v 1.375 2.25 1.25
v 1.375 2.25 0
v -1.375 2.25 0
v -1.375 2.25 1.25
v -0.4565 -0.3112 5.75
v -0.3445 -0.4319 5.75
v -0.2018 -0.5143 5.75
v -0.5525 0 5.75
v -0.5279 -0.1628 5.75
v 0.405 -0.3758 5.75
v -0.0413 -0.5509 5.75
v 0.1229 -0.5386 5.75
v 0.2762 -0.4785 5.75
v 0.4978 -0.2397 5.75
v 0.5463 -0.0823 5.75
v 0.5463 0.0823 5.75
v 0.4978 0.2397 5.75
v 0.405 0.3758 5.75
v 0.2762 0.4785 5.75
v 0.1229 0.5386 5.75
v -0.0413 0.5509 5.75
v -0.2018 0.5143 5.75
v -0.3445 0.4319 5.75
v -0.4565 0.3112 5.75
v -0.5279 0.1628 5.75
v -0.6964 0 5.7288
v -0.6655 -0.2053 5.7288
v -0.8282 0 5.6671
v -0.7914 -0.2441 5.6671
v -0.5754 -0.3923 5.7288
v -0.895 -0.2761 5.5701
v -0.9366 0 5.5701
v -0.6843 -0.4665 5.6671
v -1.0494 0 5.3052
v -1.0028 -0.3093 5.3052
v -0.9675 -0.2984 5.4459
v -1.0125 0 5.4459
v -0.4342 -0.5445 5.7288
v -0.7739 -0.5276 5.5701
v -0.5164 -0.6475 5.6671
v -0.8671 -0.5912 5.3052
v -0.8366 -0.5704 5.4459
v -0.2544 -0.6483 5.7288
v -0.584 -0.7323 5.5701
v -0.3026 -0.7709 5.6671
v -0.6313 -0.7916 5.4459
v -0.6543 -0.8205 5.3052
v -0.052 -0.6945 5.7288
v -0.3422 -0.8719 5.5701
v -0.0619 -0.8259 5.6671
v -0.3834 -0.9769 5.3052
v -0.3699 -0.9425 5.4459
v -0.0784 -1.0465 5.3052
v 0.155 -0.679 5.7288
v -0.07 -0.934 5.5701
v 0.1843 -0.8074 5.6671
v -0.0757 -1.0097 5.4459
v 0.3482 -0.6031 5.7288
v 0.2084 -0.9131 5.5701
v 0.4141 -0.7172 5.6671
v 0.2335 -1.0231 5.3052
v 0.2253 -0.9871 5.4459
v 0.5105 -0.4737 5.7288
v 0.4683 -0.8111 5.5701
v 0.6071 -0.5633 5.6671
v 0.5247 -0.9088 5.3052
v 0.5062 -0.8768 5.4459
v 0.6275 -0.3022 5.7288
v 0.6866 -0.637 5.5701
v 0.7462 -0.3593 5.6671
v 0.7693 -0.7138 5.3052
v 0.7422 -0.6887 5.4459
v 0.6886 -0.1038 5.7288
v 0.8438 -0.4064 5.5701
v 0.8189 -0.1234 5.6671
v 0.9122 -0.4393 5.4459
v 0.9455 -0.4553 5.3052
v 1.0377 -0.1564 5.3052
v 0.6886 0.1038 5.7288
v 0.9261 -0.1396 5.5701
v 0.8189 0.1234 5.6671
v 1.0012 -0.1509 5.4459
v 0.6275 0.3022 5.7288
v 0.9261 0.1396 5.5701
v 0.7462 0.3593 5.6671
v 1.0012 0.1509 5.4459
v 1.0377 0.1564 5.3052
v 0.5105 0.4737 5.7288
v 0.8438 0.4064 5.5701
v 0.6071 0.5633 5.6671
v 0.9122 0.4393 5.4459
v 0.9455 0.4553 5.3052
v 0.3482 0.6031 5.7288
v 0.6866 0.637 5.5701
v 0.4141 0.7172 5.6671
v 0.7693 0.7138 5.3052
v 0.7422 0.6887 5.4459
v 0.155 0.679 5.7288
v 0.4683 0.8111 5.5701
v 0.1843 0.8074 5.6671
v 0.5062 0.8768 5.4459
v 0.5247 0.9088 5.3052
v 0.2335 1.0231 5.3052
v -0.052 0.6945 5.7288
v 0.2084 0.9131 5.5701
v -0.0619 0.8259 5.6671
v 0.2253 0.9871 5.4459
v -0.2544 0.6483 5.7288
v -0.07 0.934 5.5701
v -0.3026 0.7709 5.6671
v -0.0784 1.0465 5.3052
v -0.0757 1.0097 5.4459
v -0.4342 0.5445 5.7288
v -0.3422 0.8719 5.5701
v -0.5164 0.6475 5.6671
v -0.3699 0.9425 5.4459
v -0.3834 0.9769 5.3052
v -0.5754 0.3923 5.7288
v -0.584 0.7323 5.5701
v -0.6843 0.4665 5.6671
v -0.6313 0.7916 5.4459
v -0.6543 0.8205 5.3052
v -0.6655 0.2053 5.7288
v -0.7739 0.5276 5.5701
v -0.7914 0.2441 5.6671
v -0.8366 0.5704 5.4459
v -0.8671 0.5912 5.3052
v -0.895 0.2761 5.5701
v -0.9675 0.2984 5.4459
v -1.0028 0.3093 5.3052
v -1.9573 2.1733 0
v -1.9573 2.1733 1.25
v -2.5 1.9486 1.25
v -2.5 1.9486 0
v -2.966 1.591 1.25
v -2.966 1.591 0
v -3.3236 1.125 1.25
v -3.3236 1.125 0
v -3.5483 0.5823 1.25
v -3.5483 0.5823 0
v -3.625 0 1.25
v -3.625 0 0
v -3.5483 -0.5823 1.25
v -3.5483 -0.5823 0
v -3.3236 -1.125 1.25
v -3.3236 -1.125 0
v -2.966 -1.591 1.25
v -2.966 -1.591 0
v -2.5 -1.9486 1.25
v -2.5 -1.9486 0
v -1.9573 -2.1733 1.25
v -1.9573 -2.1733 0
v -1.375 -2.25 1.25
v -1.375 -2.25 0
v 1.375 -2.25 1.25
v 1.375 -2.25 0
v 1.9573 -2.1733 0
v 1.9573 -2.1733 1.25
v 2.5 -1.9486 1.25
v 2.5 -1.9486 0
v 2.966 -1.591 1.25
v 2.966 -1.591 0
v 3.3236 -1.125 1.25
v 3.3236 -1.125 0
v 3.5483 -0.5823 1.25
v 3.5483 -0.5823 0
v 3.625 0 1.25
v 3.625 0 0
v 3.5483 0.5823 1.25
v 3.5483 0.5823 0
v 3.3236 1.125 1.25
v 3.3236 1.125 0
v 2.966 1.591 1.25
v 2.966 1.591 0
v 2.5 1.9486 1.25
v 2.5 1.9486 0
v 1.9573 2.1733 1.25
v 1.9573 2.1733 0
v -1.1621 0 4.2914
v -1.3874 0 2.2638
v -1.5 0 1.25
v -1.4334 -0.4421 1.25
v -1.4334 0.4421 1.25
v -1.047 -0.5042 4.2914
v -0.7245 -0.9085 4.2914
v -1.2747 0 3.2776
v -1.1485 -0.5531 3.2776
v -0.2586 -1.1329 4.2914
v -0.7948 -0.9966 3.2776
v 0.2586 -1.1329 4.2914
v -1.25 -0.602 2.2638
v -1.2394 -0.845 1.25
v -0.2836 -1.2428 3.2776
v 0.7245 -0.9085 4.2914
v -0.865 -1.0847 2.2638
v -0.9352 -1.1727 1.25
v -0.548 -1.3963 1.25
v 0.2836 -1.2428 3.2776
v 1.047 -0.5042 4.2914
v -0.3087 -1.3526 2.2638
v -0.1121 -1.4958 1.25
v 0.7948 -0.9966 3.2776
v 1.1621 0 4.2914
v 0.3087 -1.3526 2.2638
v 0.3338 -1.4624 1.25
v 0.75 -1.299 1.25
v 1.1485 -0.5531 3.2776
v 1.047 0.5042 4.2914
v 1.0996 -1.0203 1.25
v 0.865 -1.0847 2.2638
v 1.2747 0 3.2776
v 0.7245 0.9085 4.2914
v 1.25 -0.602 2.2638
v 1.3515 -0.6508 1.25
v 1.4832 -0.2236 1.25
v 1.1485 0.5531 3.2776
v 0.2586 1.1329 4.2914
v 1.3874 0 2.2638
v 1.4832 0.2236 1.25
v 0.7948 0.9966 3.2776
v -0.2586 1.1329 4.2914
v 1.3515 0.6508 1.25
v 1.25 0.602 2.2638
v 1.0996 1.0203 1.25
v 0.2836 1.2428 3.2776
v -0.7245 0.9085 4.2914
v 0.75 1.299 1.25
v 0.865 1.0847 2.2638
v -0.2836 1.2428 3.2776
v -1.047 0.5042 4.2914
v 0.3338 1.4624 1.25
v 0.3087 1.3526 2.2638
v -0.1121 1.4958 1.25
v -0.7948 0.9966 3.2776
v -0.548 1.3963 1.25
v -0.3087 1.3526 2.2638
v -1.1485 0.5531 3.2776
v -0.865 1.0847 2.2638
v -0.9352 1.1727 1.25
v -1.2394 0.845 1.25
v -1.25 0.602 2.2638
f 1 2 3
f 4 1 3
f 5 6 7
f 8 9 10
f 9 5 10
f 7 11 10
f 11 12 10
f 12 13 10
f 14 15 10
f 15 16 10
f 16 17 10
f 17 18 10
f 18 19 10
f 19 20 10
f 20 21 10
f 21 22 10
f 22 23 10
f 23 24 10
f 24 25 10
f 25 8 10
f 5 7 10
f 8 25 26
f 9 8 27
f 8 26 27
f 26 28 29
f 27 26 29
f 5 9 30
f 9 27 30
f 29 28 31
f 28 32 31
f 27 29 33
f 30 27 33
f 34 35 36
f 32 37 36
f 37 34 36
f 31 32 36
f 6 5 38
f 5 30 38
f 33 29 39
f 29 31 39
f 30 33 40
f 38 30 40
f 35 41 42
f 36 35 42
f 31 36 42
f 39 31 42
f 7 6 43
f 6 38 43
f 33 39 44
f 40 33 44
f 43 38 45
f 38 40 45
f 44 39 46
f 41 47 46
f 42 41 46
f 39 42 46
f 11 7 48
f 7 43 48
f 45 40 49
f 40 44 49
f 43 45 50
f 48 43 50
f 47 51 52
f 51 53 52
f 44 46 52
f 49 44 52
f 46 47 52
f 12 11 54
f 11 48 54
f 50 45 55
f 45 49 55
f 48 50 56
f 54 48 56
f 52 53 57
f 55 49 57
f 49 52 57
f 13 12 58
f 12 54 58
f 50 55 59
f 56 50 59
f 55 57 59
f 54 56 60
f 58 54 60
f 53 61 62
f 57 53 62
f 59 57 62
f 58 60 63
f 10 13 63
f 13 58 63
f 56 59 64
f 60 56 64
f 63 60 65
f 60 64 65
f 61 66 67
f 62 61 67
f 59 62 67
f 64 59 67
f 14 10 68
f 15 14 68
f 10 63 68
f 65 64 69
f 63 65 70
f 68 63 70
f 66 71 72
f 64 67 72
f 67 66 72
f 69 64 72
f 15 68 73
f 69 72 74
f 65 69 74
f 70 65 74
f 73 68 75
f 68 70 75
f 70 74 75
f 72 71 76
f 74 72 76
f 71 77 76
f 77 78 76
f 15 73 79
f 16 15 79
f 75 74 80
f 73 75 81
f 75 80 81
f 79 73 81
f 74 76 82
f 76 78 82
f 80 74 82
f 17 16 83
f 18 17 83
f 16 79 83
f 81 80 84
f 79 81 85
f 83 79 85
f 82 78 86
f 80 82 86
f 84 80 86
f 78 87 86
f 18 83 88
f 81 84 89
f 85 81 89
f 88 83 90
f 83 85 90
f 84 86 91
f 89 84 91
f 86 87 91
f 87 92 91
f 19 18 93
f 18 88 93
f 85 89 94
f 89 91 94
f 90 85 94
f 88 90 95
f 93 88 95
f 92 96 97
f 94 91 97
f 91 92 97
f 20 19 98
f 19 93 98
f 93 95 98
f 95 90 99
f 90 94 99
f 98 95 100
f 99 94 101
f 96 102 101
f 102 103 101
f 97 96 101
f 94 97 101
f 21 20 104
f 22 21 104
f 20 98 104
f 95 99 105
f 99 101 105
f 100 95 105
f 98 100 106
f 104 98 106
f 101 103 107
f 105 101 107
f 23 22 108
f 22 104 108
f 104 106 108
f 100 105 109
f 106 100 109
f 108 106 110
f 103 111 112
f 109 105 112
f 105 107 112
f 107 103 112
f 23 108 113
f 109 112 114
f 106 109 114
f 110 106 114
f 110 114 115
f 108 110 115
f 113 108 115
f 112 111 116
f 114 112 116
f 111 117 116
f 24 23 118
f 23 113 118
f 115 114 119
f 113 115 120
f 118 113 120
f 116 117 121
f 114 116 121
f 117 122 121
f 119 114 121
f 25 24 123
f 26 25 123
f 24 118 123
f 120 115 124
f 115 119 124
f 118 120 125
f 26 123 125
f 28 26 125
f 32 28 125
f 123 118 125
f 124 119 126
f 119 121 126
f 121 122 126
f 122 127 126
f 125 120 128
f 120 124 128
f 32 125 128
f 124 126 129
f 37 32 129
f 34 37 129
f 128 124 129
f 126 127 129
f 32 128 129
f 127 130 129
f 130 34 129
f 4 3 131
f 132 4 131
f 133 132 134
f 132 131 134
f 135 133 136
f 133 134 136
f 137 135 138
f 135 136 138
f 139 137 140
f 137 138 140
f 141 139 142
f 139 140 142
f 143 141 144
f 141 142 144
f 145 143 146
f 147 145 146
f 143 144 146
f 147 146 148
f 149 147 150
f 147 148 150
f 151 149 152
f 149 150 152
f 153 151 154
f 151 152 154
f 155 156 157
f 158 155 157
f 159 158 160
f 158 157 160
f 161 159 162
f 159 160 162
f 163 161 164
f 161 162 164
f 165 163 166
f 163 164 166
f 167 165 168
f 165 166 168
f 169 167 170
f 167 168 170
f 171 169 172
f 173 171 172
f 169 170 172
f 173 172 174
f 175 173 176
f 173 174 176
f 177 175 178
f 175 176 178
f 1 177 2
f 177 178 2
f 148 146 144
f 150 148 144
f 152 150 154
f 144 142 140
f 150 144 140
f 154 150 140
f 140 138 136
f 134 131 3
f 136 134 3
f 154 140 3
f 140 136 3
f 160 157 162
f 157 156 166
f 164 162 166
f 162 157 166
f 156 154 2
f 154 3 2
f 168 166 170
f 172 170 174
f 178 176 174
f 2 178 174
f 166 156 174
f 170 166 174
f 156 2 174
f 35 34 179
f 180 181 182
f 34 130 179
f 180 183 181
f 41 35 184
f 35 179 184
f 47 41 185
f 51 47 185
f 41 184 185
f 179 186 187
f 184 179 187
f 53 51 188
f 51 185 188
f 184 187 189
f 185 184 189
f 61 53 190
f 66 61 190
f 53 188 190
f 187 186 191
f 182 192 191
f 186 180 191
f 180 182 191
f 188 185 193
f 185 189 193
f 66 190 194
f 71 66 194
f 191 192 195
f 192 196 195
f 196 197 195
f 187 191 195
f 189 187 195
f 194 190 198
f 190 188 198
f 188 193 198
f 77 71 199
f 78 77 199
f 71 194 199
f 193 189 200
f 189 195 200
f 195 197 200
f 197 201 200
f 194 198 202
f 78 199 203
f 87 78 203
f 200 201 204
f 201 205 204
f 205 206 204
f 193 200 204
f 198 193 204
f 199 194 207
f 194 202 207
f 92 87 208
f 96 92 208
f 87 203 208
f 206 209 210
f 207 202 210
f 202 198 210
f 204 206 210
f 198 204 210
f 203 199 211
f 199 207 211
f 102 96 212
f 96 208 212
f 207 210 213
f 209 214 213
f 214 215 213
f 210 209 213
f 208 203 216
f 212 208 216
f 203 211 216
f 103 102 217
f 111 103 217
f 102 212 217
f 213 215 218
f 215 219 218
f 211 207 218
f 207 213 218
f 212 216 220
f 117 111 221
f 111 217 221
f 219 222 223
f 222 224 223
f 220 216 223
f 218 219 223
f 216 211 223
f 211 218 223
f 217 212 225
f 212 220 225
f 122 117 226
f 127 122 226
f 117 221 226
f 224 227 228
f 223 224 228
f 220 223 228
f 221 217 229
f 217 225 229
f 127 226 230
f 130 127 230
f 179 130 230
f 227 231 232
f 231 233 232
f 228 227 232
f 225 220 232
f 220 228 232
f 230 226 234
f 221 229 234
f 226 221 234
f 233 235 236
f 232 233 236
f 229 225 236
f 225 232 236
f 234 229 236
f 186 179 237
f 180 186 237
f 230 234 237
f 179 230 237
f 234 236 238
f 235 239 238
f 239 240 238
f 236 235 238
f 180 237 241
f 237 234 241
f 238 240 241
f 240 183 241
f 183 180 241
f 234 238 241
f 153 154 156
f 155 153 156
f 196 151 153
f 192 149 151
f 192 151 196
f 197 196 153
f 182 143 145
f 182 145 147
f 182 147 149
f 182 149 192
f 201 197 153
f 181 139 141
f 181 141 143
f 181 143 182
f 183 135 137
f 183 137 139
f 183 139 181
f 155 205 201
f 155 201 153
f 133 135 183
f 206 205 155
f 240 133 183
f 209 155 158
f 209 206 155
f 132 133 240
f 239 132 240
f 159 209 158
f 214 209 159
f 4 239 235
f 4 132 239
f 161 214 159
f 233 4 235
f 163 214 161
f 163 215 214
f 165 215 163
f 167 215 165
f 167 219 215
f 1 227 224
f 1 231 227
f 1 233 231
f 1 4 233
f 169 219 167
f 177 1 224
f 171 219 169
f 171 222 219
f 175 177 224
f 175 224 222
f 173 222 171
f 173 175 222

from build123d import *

# Parameters (mm, degrees)
F1_DEPTH = 1.25


with BuildPart() as f1:
    # F0 (on Top) → F1 (new body)
    with BuildSketch(Plane.XY):
        with BuildLine():
            Line((-1.375, -2.25), (1.375, -2.25))
            ThreePointArc((1.375, -2.25), (3.625, 0), (1.375, 2.25))
            Line((1.375, 2.25), (-1.375, 2.25))
            ThreePointArc((-1.375, 2.25), (-3.625, 0), (-1.375, -2.25))
        make_face()
    extrude(amount=F1_DEPTH)

    # F2 (on Front) → F3 (revolve)
    with BuildSketch(Plane.XZ):
        with BuildLine():
            Line((-1.5, 1.25), (0, 1.25))
            Line((0, 1.25), (0, 5.75))
            Line((0, 5.75), (-0.552479, 5.75))
            ThreePointArc((-0.552479, 5.75), (-0.885939, 5.622564), (-1.04942, 5.305216))
            Line((-1.04942, 5.305216), (-1.5, 1.25))
        make_face()
    revolve(axis=Axis((0, 0, 3.5), (0, 0, 1)))


solid = f1.part
